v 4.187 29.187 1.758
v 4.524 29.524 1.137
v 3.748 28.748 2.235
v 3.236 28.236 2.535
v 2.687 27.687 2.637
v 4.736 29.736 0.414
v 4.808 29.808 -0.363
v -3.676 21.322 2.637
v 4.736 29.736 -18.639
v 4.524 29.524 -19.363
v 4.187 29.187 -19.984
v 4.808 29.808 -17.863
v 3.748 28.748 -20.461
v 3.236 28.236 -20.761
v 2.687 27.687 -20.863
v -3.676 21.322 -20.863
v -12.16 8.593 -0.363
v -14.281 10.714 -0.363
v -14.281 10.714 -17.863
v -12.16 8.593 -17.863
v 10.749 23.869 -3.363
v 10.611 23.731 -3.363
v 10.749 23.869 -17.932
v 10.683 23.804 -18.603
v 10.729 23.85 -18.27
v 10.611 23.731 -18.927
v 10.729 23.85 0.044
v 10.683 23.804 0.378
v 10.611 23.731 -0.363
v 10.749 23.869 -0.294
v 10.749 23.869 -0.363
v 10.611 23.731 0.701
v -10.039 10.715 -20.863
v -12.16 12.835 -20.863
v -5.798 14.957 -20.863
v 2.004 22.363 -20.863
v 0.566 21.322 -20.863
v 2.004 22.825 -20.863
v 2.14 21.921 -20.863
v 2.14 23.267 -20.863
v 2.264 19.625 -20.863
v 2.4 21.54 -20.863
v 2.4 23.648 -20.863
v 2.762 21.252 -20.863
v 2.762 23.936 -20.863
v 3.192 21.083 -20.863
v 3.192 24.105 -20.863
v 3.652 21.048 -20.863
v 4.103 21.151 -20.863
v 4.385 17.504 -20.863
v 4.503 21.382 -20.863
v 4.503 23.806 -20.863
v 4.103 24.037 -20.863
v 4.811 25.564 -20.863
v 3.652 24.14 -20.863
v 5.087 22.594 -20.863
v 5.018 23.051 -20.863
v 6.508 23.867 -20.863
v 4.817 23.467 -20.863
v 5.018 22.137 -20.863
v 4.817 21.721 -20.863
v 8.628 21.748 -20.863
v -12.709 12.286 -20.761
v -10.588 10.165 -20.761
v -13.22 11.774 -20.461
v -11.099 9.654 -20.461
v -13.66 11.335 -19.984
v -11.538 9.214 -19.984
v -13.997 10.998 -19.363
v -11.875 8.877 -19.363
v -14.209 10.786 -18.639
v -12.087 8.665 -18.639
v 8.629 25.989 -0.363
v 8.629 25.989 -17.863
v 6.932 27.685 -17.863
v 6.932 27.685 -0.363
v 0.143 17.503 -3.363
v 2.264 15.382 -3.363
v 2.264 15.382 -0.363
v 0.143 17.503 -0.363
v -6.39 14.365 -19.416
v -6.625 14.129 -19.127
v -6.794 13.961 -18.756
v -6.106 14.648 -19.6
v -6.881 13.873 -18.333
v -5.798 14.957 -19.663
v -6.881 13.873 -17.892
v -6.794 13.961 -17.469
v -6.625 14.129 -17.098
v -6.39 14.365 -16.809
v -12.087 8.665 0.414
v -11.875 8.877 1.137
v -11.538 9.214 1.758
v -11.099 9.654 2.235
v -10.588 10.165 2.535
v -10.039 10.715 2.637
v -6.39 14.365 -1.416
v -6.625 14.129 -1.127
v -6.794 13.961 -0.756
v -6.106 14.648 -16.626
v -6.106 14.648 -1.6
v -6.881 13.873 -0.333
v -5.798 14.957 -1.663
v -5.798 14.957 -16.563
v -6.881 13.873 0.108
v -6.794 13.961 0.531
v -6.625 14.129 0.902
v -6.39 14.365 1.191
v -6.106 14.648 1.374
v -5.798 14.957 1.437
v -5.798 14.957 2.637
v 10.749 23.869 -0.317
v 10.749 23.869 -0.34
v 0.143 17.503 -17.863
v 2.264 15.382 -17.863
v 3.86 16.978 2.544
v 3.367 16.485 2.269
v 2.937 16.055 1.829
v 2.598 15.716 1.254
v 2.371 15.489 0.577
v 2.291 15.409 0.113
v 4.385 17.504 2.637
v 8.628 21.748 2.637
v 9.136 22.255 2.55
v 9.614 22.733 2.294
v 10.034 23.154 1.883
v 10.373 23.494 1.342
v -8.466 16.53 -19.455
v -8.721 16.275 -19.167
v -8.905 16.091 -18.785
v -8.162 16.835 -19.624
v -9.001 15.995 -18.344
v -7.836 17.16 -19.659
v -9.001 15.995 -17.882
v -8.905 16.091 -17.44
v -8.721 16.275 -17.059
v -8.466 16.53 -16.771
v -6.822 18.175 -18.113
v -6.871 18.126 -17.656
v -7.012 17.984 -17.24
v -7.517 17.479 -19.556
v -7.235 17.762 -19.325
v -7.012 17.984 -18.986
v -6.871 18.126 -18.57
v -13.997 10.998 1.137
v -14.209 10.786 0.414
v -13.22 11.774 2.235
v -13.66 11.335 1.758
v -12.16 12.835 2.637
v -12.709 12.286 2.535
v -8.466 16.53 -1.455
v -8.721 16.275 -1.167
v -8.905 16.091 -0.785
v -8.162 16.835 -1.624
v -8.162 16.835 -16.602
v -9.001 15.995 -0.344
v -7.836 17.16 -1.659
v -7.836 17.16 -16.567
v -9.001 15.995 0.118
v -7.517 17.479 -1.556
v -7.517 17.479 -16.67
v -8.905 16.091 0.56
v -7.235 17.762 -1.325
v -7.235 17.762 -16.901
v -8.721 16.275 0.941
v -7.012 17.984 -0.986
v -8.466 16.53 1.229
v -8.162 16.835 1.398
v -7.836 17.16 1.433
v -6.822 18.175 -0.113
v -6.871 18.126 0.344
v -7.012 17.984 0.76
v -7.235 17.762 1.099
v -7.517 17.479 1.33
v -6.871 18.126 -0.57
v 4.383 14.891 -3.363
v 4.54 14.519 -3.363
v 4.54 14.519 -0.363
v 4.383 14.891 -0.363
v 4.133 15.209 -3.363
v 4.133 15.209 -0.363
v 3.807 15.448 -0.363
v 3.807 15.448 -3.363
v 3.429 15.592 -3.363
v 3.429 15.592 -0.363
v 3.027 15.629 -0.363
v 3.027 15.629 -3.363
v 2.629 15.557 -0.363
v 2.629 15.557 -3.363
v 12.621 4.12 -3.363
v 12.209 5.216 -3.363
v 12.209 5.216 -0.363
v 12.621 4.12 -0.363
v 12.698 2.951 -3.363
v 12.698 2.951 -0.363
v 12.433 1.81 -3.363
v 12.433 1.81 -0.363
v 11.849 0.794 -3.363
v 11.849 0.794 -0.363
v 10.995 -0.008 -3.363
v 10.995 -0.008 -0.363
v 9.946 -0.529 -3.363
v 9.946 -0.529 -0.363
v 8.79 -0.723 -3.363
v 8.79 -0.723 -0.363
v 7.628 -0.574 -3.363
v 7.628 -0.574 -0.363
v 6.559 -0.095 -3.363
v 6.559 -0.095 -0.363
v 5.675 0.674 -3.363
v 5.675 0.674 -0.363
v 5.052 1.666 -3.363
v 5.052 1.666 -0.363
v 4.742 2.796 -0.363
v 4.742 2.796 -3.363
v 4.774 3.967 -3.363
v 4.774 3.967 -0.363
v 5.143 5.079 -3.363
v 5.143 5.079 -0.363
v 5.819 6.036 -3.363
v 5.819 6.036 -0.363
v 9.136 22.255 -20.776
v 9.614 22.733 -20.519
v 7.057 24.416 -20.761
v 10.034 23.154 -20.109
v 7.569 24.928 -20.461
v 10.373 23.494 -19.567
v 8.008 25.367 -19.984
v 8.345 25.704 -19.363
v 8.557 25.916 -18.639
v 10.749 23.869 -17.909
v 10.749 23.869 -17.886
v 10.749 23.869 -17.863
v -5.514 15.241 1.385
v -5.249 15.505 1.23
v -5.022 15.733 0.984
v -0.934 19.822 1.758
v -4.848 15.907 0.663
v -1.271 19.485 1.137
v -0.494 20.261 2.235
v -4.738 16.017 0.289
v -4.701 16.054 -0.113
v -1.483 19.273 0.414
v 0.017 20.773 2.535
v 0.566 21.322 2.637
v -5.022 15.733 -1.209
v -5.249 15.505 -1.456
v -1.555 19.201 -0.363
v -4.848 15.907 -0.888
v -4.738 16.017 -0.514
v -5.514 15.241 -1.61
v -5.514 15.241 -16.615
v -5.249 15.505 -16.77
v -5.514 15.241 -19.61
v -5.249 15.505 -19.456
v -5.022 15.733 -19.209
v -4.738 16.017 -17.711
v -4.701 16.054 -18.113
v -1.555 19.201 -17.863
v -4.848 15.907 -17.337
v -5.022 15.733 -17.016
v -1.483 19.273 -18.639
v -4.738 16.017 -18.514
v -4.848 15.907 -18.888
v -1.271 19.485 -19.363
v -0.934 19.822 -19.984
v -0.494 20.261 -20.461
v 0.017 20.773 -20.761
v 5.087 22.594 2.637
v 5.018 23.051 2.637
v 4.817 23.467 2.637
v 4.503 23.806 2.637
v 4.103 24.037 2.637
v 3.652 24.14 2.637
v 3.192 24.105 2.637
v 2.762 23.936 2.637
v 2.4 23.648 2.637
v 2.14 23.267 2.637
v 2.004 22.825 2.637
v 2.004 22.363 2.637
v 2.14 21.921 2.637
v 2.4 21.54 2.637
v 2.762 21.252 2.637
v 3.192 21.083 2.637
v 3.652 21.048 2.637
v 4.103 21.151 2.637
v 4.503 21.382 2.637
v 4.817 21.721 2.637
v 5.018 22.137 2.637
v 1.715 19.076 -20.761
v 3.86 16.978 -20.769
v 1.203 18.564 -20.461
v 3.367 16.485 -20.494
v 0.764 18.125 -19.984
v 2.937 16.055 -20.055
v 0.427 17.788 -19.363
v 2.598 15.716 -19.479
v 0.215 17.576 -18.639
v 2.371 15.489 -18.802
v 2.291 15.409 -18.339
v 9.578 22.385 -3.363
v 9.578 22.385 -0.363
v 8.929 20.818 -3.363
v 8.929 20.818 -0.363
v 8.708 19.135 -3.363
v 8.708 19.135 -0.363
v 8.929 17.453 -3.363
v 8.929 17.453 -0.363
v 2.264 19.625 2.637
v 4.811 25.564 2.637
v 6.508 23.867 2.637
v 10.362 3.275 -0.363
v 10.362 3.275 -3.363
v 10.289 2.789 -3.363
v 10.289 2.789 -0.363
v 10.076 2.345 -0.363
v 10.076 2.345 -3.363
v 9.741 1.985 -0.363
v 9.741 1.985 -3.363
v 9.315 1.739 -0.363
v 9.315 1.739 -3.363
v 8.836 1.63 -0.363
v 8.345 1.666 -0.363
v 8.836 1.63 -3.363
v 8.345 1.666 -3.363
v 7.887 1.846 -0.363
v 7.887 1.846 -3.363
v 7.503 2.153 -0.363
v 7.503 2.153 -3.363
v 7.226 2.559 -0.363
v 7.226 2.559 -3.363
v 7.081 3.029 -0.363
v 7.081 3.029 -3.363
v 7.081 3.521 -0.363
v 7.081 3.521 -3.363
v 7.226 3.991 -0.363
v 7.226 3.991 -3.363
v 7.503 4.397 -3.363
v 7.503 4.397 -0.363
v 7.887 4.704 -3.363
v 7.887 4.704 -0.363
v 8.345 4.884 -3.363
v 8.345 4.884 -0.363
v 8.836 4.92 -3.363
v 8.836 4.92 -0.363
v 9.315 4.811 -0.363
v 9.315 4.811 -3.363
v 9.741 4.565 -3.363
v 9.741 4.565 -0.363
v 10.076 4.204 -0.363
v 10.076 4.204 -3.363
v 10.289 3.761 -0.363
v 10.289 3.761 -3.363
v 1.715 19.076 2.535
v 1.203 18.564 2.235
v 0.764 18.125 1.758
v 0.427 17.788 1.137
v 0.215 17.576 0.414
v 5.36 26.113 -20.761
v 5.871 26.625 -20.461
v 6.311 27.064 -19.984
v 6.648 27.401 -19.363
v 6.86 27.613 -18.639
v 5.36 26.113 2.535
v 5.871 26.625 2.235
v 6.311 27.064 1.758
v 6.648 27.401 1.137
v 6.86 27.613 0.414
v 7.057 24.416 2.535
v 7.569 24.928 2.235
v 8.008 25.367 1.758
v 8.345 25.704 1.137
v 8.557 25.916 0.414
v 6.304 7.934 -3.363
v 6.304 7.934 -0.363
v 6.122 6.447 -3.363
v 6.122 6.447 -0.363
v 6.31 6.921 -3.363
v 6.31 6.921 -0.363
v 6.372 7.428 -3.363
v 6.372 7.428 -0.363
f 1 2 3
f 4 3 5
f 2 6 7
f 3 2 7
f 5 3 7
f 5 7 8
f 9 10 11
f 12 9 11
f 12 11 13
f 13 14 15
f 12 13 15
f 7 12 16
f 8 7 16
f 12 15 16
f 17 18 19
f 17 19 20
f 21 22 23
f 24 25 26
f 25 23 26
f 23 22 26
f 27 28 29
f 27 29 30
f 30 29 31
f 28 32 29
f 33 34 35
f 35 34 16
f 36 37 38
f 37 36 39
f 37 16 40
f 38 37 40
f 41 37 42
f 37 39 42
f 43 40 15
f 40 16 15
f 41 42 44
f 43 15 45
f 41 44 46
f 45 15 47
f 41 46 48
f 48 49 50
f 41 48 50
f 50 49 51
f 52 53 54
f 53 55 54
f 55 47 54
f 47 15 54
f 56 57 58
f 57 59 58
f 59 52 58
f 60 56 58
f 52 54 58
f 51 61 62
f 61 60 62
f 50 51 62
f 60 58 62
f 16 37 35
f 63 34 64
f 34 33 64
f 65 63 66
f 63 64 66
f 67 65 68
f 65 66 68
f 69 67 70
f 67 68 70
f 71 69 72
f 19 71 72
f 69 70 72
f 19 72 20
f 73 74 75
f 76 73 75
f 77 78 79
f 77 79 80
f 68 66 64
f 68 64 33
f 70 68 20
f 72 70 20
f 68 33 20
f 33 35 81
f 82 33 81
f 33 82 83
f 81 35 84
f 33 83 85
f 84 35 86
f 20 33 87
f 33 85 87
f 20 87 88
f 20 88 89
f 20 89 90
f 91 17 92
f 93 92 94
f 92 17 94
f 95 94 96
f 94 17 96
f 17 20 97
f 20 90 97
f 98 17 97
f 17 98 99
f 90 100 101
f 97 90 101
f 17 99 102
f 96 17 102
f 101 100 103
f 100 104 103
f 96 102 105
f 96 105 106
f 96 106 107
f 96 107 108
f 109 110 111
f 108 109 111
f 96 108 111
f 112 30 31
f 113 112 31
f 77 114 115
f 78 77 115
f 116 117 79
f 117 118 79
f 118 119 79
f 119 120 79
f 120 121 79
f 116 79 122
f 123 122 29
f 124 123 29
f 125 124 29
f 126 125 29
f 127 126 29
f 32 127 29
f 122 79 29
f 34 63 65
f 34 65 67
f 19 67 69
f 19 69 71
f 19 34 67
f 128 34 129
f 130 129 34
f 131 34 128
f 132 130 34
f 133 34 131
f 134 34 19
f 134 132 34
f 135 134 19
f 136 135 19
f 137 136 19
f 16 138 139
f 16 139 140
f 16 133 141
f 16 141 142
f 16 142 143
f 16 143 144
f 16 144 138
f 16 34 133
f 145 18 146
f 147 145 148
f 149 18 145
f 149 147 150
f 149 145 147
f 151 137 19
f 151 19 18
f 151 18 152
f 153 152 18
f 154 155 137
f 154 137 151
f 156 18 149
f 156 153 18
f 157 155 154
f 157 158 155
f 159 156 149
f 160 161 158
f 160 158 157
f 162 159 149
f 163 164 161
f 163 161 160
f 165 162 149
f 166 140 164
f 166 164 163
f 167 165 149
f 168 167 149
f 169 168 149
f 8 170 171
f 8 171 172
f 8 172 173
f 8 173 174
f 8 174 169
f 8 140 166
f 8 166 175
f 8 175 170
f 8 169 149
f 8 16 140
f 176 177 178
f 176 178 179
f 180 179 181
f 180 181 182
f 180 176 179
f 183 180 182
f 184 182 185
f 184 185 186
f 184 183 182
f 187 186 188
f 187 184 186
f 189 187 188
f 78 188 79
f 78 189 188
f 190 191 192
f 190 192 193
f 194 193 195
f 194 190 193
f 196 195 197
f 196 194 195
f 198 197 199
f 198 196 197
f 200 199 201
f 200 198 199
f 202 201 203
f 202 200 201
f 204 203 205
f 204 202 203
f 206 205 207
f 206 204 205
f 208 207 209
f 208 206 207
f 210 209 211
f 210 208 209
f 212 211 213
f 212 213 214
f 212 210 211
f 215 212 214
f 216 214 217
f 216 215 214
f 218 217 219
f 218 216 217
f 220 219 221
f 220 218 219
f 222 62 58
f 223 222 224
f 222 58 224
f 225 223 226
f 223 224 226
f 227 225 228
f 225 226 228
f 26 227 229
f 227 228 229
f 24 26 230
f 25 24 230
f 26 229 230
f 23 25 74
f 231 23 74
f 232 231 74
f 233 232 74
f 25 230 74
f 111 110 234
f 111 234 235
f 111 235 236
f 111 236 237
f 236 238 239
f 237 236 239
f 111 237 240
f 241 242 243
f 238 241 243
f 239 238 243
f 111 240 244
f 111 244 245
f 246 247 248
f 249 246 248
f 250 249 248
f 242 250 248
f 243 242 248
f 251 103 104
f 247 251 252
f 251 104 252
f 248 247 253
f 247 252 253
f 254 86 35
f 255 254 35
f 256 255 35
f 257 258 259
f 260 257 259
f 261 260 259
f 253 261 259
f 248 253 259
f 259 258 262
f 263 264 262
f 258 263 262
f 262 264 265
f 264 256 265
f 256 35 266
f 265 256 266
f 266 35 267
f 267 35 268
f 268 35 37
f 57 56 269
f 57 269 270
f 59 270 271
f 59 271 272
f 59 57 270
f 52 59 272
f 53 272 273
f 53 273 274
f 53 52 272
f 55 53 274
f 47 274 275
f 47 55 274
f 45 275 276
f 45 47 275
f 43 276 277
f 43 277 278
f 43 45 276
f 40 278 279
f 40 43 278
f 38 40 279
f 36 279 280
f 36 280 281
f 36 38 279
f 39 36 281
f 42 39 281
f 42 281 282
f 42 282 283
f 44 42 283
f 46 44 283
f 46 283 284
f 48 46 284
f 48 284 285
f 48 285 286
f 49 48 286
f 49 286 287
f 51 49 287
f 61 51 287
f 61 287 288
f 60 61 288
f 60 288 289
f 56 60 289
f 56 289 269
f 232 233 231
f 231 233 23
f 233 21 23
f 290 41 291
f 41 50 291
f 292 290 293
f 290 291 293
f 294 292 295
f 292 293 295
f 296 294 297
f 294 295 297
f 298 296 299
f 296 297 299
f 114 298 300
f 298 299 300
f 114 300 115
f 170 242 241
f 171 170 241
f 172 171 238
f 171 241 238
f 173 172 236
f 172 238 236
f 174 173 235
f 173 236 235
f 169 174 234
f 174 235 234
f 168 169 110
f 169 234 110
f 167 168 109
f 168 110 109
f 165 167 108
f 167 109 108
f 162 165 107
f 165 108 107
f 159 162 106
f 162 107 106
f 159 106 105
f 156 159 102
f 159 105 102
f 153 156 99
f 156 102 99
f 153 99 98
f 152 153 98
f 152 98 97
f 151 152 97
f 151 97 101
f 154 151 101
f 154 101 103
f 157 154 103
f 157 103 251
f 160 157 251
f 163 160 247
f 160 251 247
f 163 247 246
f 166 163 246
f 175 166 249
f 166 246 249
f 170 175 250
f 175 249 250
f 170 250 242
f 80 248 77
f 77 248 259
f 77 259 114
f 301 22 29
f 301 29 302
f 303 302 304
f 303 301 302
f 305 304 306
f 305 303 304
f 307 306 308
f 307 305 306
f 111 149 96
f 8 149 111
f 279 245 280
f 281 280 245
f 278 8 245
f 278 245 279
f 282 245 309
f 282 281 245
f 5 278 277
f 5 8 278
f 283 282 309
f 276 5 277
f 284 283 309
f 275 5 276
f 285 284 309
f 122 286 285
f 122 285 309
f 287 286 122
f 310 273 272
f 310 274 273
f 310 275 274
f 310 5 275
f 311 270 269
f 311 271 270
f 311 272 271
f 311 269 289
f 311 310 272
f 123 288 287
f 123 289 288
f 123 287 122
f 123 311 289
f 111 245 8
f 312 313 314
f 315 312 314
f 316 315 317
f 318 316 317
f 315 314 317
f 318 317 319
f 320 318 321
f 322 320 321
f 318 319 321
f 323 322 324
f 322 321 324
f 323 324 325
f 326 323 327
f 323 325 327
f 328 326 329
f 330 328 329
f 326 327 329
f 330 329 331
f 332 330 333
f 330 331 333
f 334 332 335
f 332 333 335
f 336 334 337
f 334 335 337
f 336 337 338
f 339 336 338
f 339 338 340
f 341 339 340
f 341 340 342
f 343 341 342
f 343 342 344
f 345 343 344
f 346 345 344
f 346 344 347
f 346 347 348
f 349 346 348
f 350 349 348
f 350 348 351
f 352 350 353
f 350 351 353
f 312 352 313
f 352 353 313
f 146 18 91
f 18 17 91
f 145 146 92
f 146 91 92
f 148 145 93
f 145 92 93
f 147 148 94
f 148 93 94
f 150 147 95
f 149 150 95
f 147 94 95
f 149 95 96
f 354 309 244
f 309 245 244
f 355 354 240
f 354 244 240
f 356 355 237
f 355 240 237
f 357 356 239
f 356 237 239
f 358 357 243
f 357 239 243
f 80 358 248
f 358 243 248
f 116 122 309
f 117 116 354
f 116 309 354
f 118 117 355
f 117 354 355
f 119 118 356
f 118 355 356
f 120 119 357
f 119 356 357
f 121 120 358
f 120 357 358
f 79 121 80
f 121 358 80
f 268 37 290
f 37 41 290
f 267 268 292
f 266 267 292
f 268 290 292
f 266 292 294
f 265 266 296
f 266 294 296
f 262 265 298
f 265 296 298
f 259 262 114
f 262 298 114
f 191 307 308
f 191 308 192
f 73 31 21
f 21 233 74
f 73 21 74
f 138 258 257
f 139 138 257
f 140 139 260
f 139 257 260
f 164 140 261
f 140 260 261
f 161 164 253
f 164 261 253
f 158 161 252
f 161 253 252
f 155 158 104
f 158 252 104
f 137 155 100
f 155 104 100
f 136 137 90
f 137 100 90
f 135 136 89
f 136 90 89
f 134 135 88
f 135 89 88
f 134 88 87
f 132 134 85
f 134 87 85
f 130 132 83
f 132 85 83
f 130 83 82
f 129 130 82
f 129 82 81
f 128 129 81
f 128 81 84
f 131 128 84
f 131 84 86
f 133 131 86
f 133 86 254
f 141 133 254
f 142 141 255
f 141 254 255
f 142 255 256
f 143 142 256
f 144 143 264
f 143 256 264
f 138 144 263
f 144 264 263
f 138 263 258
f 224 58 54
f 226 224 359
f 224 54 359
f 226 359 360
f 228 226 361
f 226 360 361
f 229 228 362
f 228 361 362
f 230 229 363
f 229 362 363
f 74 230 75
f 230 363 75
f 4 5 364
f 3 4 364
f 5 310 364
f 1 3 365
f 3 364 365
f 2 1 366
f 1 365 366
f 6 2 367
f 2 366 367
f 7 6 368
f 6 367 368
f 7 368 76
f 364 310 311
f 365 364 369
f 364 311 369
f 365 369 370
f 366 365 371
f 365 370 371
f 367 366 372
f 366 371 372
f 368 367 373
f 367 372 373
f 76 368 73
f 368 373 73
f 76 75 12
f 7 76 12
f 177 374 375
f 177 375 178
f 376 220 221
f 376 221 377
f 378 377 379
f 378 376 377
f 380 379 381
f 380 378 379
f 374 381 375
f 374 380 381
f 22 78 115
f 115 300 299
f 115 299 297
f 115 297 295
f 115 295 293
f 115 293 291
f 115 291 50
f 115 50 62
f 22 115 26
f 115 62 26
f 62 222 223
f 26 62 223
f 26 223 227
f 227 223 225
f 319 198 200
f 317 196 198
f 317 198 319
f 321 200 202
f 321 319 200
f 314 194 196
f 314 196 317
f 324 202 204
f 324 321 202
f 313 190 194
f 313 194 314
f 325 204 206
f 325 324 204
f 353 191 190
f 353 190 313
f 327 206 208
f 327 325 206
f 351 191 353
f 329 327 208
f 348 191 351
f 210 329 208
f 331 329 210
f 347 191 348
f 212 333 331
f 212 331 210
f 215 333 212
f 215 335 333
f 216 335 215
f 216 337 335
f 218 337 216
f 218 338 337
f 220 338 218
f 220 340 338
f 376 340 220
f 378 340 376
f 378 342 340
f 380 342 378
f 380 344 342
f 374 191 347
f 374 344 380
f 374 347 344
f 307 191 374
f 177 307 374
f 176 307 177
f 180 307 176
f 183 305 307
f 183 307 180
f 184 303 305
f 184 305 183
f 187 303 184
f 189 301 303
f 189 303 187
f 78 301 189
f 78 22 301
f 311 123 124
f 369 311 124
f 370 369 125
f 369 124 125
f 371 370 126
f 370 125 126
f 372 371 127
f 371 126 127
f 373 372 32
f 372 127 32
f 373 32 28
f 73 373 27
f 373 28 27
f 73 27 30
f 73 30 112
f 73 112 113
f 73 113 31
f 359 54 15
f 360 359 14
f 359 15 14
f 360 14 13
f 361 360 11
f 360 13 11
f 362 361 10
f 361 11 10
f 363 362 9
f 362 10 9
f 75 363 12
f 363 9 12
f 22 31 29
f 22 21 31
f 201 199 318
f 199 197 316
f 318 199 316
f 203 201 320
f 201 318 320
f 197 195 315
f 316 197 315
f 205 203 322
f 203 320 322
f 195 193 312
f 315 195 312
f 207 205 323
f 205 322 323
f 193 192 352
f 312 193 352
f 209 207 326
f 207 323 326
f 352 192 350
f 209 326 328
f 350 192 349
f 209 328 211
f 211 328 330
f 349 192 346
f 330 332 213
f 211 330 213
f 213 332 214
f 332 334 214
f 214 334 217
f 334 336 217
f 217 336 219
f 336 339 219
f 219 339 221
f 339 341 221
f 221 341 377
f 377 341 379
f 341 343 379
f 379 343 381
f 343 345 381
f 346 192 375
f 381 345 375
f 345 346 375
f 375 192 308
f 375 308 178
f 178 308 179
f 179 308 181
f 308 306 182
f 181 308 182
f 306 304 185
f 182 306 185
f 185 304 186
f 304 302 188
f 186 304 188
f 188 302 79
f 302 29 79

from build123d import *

# Parameters (mm, degrees)
SKETCH_1_R           = 1.55
SKETCH_1_R_2         = 1.65
EXTRUDE_1_DEPTH      = 3
EXTRUDE_5_DEPTH      = 3
EXTRUDE_5_DEPTH_BACK = 20.5
SKETCH_2_R           = 1.55
SKETCH_3_W           = 2.999466183
SKETCH_3_H           = 23.5
EXTRUDE_9_DEPTH      = 15
CUT_EXTRUDE_1_DEPTH  = 43.137686458
CUT_EXTRUDE_2_DEPTH  = 41.555271529
SKETCH_6_R           = 1.55
CUT_EXTRUDE_3_DEPTH  = 10
FILLET_1_R           = 3
FILLET_2_R           = 3
FILLET_3_R           = 3


with BuildPart() as part:
    # 草图1 → 凸台-拉伸1 (new body)
    with BuildSketch(Plane(origin=(0, 0, -3.362857667), x_dir=(-1, 0, 0), z_dir=(0, 0, -1))):
        with BuildLine():
            Line((-8.929456987, 17.45330102), (-12.208534908, 5.216337034))
            ThreePointArc((-12.208534908, 5.216337034), (-8.203956956, -0.691485495), (-5.819308033, 6.03550946))
            ThreePointArc((-5.819308033, 6.03550946), (-6.310108859, 6.921233679), (-6.304159928, 7.933833034))
            Line((-6.304159928, 7.933833034), (-4.539684391, 14.518557193))
            ThreePointArc((-4.539684391, 14.518557193), (-3.62301138, 15.532716808), (-2.264294404, 15.382060533))
            Line((-2.264294404, 15.382060533), (-0.142530428, 17.503217343))
            Line((-0.142530428, 17.503217343), (4.099819599, 13.25965297))
            Line((4.099819599, 13.25965297), (5.797509256, 14.956856814))
            Line((5.797509256, 14.956856814), (1.554532399, 19.201048196))
            Line((1.554532399, 19.201048196), (3.675778765, 21.321687543))
            Line((3.675778765, 21.321687543), (-4.808443123, 29.808337985))
            Line((-4.808443123, 29.808337985), (-6.931968366, 27.685420414))
            Line((-6.931968366, 27.685420414), (-11.173246227, 31.927912314))
            Line((-11.173246227, 31.927912314), (-12.870428791, 30.231215419))
            Line((-12.870428791, 30.231215419), (-8.629080401, 25.98865297))
            Line((-8.629080401, 25.98865297), (-10.749072595, 23.869267436))
            Line((-10.749072595, 23.869267436), (-10.611098311, 23.731253658))
            ThreePointArc((-10.611098311, 23.731253658), (-8.929299443, 20.817545637), (-8.929456987, 17.45330102))
        make_face()
        with Locations(Location((-3.536567574, 22.593983824, 0), (0, 0, 180))):
            Circle(SKETCH_1_R, mode=Mode.SUBTRACT)
        with Locations(Location((-8.71249984, 3.274951558, 0), (0, 0, 180))):
            Circle(SKETCH_1_R_2, mode=Mode.SUBTRACT)
    extrude(amount=-EXTRUDE_1_DEPTH)

    # 草图2 → 凸台-拉伸5 (add, two sides: drawn at the far end of the back side and taken through both)
    with BuildSketch(Plane.XY.offset(-0.362857667).offset(-EXTRUDE_5_DEPTH_BACK)):
        Polygon((6.931968366, 27.685420414), (4.808443123, 29.808337985), (-3.675778765, 21.321687543), (-1.554532399, 19.201048196), (-1.554756221, 19.20082431), (-5.797509256, 14.956856814), (-4.099819599, 13.25965297), (0.142530428, 17.503217343), (0.142754305, 17.503441284), (2.264294404, 15.382060533), (10.611098311, 23.731253658), (10.748516293, 23.868710975), (10.749072595, 23.869267436), (8.629080401, 25.98865297), (12.870358263, 30.23114487), (11.173246227, 31.927912314), align=None)
        with Locations((3.536567574, 22.593983824)):
            Circle(SKETCH_2_R, mode=Mode.SUBTRACT)
    extrude(amount=EXTRUDE_5_DEPTH + EXTRUDE_5_DEPTH_BACK)

    # 草图3 → 凸台-拉伸9 (add)
    with BuildSketch(Plane(origin=(8.823479961, 8.826005625, 0), x_dir=(0.7072079618145243, -0.7070055860784599, 0), z_dir=(-0.7070055860784599, -0.7072079618145243, 0))):
        with Locations((-16.174359114, -9.112857667)):
            Rectangle(SKETCH_3_W, SKETCH_3_H)
    extrude(amount=EXTRUDE_9_DEPTH)

    # 草图4 → 切除-拉伸1 (cut, through all)
    with BuildSketch(Plane(origin=(0, 0, -20.862857667), x_dir=(-1, 0, 0), z_dir=(0, 0, -1))):
        Polygon((-11.306274604, 32.060978769), (-13.003386639, 30.364211325), (-8.629080401, 25.98865297), (-6.931968366, 27.685420414), align=None)
    extrude(amount=-CUT_EXTRUDE_1_DEPTH, mode=Mode.SUBTRACT)

    # 草图5 → 切除-拉伸2 (cut, through all)
    with BuildSketch(Plane(origin=(0, 0, -20.862857667), x_dir=(-1, 0, 0), z_dir=(0, 0, -1))):
        Polygon((-0.142754305, 17.503441284), (4.099819599, 13.25965297), (5.797509256, 14.956856814), (1.554935352, 19.200645127), align=None)
    extrude(amount=-CUT_EXTRUDE_2_DEPTH, mode=Mode.SUBTRACT)

    # 草图6 → 切除-拉伸3 (cut)
    with BuildSketch(Plane(origin=(-10.37801236, 10.375042572, 0), x_dir=(0, 0, -1), z_dir=(0.7072079618145242, -0.7070055860784599, 0))):
        with Locations(Location((0.112857667, 6.48007107, 0), (0, 0, 90))):
            Circle(SKETCH_6_R)
        with Locations(Location((18.112857667, 6.48007107, 0), (0, 0, 90))):
            Circle(SKETCH_6_R)
    extrude(amount=-CUT_EXTRUDE_3_DEPTH, mode=Mode.SUBTRACT)

    # 圆角1
    fillet_1_edges = [part.edges().sort_by_distance(p)[0] for p in [
        (-0.706090524, 18.352043206, 2.637142333),
        (-0.706090524, 18.352043206, -20.862857667),
        (1.203524355, 16.442750908, -20.862857667),
        (1.203524355, 16.442750908, 2.637142333),
    ]]
    fillet(fillet_1_edges, radius=FILLET_1_R - 0.0001)  # a hair under: the kernel refuses the full size

    # 圆角2
    fillet_2_edges = [part.edges().sort_by_distance(p)[0] for p in [
        (7.780524383, 26.837036692, 2.637142333),
        (7.780524383, 26.837036692, -20.862857667),
        (9.689076498, 24.928960203, -20.862857667),
        (5.870205744, 28.746879199, -20.862857667),
        (9.689076498, 24.928960203, 2.637142333),
        (5.870205744, 28.746879199, 2.637142333),
    ]]
    fillet(fillet_2_edges, radius=FILLET_2_R)

    # 圆角3
    fillet_3_edges = [part.edges().sort_by_distance(p)[0] for p in [
        (-13.220239373, 9.653248443, -20.862857667),
        (-13.220239373, 9.653248443, 2.637142333),
    ]]
    fillet(fillet_3_edges, radius=FILLET_3_R)


solid = part.part
